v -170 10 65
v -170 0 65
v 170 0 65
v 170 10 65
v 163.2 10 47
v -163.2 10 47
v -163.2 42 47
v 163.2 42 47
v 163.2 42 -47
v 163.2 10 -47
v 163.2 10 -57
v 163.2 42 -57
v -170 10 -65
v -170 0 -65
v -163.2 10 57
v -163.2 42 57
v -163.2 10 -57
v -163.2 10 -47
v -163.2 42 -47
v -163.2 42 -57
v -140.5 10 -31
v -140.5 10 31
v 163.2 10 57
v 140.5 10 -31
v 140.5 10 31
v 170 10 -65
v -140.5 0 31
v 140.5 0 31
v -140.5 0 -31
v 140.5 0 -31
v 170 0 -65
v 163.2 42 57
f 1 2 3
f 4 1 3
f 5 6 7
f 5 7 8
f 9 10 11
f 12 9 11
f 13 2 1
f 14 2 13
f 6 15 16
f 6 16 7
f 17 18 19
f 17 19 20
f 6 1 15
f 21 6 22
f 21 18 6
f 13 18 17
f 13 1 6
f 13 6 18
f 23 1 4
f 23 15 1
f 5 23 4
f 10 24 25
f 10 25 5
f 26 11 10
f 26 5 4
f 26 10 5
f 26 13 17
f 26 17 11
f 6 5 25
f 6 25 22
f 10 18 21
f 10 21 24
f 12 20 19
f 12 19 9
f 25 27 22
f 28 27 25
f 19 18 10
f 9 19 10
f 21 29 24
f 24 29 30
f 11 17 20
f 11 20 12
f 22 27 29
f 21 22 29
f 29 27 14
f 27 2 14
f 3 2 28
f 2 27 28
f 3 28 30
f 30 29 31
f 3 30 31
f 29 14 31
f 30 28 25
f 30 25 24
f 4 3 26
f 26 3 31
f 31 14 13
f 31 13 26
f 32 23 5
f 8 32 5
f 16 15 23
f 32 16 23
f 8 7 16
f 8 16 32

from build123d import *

# Parameters (mm, degrees)
F_01_RAIL_BASE_PROFILE_W   = 340
F_01_RAIL_BASE_PROFILE_H   = 130
F_01_RAIL_BASE_PROFILE_R   = 4.5
F_01_RAIL_BASE_PROFILE_W_2 = 281
F_01_RAIL_BASE_PROFILE_H_2 = 62
F_01_RAIL_BASE_DEPTH       = 10
F_02_GUIDE_RAIL_PROFILES_W = 326.4
F_02_GUIDE_RAIL_PROFILES_H = 10
F_02_GUIDE_RAILS_DEPTH     = 42


with BuildPart() as part:
    # 01_Rail_Base_Profile → 01_Rail_Base (new body)
    with BuildSketch(Plane(origin=(0, 0, 0), x_dir=(1, 0, 0), z_dir=(0, 1, 0))):
        Rectangle(F_01_RAIL_BASE_PROFILE_W, F_01_RAIL_BASE_PROFILE_H)
        with Locations(Location((-145, -52, 0), (0, 0, 270))):
            Circle(F_01_RAIL_BASE_PROFILE_R, mode=Mode.SUBTRACT)
        with Locations(Location((-145, 52, 0), (0, 0, 270))):
            Circle(F_01_RAIL_BASE_PROFILE_R, mode=Mode.SUBTRACT)
        with Locations(Location((145, -52, 0), (0, 0, 270))):
            Circle(F_01_RAIL_BASE_PROFILE_R, mode=Mode.SUBTRACT)
        with Locations(Location((145, 52, 0), (0, 0, 270))):
            Circle(F_01_RAIL_BASE_PROFILE_R, mode=Mode.SUBTRACT)
        Rectangle(F_01_RAIL_BASE_PROFILE_W_2, F_01_RAIL_BASE_PROFILE_H_2, mode=Mode.SUBTRACT)
    extrude(amount=F_01_RAIL_BASE_DEPTH)

    # 02_Guide_Rail_Profiles → 02_Guide_Rails (add)
    with BuildSketch(Plane(origin=(0, 0, 0), x_dir=(1, 0, 0), z_dir=(0, 1, 0))):
        with Locations((0, 52)):
            Rectangle(F_02_GUIDE_RAIL_PROFILES_W, F_02_GUIDE_RAIL_PROFILES_H)
        with Locations((0, -52)):
            Rectangle(F_02_GUIDE_RAIL_PROFILES_W, F_02_GUIDE_RAIL_PROFILES_H)
    extrude(amount=F_02_GUIDE_RAILS_DEPTH)


solid = part.part
